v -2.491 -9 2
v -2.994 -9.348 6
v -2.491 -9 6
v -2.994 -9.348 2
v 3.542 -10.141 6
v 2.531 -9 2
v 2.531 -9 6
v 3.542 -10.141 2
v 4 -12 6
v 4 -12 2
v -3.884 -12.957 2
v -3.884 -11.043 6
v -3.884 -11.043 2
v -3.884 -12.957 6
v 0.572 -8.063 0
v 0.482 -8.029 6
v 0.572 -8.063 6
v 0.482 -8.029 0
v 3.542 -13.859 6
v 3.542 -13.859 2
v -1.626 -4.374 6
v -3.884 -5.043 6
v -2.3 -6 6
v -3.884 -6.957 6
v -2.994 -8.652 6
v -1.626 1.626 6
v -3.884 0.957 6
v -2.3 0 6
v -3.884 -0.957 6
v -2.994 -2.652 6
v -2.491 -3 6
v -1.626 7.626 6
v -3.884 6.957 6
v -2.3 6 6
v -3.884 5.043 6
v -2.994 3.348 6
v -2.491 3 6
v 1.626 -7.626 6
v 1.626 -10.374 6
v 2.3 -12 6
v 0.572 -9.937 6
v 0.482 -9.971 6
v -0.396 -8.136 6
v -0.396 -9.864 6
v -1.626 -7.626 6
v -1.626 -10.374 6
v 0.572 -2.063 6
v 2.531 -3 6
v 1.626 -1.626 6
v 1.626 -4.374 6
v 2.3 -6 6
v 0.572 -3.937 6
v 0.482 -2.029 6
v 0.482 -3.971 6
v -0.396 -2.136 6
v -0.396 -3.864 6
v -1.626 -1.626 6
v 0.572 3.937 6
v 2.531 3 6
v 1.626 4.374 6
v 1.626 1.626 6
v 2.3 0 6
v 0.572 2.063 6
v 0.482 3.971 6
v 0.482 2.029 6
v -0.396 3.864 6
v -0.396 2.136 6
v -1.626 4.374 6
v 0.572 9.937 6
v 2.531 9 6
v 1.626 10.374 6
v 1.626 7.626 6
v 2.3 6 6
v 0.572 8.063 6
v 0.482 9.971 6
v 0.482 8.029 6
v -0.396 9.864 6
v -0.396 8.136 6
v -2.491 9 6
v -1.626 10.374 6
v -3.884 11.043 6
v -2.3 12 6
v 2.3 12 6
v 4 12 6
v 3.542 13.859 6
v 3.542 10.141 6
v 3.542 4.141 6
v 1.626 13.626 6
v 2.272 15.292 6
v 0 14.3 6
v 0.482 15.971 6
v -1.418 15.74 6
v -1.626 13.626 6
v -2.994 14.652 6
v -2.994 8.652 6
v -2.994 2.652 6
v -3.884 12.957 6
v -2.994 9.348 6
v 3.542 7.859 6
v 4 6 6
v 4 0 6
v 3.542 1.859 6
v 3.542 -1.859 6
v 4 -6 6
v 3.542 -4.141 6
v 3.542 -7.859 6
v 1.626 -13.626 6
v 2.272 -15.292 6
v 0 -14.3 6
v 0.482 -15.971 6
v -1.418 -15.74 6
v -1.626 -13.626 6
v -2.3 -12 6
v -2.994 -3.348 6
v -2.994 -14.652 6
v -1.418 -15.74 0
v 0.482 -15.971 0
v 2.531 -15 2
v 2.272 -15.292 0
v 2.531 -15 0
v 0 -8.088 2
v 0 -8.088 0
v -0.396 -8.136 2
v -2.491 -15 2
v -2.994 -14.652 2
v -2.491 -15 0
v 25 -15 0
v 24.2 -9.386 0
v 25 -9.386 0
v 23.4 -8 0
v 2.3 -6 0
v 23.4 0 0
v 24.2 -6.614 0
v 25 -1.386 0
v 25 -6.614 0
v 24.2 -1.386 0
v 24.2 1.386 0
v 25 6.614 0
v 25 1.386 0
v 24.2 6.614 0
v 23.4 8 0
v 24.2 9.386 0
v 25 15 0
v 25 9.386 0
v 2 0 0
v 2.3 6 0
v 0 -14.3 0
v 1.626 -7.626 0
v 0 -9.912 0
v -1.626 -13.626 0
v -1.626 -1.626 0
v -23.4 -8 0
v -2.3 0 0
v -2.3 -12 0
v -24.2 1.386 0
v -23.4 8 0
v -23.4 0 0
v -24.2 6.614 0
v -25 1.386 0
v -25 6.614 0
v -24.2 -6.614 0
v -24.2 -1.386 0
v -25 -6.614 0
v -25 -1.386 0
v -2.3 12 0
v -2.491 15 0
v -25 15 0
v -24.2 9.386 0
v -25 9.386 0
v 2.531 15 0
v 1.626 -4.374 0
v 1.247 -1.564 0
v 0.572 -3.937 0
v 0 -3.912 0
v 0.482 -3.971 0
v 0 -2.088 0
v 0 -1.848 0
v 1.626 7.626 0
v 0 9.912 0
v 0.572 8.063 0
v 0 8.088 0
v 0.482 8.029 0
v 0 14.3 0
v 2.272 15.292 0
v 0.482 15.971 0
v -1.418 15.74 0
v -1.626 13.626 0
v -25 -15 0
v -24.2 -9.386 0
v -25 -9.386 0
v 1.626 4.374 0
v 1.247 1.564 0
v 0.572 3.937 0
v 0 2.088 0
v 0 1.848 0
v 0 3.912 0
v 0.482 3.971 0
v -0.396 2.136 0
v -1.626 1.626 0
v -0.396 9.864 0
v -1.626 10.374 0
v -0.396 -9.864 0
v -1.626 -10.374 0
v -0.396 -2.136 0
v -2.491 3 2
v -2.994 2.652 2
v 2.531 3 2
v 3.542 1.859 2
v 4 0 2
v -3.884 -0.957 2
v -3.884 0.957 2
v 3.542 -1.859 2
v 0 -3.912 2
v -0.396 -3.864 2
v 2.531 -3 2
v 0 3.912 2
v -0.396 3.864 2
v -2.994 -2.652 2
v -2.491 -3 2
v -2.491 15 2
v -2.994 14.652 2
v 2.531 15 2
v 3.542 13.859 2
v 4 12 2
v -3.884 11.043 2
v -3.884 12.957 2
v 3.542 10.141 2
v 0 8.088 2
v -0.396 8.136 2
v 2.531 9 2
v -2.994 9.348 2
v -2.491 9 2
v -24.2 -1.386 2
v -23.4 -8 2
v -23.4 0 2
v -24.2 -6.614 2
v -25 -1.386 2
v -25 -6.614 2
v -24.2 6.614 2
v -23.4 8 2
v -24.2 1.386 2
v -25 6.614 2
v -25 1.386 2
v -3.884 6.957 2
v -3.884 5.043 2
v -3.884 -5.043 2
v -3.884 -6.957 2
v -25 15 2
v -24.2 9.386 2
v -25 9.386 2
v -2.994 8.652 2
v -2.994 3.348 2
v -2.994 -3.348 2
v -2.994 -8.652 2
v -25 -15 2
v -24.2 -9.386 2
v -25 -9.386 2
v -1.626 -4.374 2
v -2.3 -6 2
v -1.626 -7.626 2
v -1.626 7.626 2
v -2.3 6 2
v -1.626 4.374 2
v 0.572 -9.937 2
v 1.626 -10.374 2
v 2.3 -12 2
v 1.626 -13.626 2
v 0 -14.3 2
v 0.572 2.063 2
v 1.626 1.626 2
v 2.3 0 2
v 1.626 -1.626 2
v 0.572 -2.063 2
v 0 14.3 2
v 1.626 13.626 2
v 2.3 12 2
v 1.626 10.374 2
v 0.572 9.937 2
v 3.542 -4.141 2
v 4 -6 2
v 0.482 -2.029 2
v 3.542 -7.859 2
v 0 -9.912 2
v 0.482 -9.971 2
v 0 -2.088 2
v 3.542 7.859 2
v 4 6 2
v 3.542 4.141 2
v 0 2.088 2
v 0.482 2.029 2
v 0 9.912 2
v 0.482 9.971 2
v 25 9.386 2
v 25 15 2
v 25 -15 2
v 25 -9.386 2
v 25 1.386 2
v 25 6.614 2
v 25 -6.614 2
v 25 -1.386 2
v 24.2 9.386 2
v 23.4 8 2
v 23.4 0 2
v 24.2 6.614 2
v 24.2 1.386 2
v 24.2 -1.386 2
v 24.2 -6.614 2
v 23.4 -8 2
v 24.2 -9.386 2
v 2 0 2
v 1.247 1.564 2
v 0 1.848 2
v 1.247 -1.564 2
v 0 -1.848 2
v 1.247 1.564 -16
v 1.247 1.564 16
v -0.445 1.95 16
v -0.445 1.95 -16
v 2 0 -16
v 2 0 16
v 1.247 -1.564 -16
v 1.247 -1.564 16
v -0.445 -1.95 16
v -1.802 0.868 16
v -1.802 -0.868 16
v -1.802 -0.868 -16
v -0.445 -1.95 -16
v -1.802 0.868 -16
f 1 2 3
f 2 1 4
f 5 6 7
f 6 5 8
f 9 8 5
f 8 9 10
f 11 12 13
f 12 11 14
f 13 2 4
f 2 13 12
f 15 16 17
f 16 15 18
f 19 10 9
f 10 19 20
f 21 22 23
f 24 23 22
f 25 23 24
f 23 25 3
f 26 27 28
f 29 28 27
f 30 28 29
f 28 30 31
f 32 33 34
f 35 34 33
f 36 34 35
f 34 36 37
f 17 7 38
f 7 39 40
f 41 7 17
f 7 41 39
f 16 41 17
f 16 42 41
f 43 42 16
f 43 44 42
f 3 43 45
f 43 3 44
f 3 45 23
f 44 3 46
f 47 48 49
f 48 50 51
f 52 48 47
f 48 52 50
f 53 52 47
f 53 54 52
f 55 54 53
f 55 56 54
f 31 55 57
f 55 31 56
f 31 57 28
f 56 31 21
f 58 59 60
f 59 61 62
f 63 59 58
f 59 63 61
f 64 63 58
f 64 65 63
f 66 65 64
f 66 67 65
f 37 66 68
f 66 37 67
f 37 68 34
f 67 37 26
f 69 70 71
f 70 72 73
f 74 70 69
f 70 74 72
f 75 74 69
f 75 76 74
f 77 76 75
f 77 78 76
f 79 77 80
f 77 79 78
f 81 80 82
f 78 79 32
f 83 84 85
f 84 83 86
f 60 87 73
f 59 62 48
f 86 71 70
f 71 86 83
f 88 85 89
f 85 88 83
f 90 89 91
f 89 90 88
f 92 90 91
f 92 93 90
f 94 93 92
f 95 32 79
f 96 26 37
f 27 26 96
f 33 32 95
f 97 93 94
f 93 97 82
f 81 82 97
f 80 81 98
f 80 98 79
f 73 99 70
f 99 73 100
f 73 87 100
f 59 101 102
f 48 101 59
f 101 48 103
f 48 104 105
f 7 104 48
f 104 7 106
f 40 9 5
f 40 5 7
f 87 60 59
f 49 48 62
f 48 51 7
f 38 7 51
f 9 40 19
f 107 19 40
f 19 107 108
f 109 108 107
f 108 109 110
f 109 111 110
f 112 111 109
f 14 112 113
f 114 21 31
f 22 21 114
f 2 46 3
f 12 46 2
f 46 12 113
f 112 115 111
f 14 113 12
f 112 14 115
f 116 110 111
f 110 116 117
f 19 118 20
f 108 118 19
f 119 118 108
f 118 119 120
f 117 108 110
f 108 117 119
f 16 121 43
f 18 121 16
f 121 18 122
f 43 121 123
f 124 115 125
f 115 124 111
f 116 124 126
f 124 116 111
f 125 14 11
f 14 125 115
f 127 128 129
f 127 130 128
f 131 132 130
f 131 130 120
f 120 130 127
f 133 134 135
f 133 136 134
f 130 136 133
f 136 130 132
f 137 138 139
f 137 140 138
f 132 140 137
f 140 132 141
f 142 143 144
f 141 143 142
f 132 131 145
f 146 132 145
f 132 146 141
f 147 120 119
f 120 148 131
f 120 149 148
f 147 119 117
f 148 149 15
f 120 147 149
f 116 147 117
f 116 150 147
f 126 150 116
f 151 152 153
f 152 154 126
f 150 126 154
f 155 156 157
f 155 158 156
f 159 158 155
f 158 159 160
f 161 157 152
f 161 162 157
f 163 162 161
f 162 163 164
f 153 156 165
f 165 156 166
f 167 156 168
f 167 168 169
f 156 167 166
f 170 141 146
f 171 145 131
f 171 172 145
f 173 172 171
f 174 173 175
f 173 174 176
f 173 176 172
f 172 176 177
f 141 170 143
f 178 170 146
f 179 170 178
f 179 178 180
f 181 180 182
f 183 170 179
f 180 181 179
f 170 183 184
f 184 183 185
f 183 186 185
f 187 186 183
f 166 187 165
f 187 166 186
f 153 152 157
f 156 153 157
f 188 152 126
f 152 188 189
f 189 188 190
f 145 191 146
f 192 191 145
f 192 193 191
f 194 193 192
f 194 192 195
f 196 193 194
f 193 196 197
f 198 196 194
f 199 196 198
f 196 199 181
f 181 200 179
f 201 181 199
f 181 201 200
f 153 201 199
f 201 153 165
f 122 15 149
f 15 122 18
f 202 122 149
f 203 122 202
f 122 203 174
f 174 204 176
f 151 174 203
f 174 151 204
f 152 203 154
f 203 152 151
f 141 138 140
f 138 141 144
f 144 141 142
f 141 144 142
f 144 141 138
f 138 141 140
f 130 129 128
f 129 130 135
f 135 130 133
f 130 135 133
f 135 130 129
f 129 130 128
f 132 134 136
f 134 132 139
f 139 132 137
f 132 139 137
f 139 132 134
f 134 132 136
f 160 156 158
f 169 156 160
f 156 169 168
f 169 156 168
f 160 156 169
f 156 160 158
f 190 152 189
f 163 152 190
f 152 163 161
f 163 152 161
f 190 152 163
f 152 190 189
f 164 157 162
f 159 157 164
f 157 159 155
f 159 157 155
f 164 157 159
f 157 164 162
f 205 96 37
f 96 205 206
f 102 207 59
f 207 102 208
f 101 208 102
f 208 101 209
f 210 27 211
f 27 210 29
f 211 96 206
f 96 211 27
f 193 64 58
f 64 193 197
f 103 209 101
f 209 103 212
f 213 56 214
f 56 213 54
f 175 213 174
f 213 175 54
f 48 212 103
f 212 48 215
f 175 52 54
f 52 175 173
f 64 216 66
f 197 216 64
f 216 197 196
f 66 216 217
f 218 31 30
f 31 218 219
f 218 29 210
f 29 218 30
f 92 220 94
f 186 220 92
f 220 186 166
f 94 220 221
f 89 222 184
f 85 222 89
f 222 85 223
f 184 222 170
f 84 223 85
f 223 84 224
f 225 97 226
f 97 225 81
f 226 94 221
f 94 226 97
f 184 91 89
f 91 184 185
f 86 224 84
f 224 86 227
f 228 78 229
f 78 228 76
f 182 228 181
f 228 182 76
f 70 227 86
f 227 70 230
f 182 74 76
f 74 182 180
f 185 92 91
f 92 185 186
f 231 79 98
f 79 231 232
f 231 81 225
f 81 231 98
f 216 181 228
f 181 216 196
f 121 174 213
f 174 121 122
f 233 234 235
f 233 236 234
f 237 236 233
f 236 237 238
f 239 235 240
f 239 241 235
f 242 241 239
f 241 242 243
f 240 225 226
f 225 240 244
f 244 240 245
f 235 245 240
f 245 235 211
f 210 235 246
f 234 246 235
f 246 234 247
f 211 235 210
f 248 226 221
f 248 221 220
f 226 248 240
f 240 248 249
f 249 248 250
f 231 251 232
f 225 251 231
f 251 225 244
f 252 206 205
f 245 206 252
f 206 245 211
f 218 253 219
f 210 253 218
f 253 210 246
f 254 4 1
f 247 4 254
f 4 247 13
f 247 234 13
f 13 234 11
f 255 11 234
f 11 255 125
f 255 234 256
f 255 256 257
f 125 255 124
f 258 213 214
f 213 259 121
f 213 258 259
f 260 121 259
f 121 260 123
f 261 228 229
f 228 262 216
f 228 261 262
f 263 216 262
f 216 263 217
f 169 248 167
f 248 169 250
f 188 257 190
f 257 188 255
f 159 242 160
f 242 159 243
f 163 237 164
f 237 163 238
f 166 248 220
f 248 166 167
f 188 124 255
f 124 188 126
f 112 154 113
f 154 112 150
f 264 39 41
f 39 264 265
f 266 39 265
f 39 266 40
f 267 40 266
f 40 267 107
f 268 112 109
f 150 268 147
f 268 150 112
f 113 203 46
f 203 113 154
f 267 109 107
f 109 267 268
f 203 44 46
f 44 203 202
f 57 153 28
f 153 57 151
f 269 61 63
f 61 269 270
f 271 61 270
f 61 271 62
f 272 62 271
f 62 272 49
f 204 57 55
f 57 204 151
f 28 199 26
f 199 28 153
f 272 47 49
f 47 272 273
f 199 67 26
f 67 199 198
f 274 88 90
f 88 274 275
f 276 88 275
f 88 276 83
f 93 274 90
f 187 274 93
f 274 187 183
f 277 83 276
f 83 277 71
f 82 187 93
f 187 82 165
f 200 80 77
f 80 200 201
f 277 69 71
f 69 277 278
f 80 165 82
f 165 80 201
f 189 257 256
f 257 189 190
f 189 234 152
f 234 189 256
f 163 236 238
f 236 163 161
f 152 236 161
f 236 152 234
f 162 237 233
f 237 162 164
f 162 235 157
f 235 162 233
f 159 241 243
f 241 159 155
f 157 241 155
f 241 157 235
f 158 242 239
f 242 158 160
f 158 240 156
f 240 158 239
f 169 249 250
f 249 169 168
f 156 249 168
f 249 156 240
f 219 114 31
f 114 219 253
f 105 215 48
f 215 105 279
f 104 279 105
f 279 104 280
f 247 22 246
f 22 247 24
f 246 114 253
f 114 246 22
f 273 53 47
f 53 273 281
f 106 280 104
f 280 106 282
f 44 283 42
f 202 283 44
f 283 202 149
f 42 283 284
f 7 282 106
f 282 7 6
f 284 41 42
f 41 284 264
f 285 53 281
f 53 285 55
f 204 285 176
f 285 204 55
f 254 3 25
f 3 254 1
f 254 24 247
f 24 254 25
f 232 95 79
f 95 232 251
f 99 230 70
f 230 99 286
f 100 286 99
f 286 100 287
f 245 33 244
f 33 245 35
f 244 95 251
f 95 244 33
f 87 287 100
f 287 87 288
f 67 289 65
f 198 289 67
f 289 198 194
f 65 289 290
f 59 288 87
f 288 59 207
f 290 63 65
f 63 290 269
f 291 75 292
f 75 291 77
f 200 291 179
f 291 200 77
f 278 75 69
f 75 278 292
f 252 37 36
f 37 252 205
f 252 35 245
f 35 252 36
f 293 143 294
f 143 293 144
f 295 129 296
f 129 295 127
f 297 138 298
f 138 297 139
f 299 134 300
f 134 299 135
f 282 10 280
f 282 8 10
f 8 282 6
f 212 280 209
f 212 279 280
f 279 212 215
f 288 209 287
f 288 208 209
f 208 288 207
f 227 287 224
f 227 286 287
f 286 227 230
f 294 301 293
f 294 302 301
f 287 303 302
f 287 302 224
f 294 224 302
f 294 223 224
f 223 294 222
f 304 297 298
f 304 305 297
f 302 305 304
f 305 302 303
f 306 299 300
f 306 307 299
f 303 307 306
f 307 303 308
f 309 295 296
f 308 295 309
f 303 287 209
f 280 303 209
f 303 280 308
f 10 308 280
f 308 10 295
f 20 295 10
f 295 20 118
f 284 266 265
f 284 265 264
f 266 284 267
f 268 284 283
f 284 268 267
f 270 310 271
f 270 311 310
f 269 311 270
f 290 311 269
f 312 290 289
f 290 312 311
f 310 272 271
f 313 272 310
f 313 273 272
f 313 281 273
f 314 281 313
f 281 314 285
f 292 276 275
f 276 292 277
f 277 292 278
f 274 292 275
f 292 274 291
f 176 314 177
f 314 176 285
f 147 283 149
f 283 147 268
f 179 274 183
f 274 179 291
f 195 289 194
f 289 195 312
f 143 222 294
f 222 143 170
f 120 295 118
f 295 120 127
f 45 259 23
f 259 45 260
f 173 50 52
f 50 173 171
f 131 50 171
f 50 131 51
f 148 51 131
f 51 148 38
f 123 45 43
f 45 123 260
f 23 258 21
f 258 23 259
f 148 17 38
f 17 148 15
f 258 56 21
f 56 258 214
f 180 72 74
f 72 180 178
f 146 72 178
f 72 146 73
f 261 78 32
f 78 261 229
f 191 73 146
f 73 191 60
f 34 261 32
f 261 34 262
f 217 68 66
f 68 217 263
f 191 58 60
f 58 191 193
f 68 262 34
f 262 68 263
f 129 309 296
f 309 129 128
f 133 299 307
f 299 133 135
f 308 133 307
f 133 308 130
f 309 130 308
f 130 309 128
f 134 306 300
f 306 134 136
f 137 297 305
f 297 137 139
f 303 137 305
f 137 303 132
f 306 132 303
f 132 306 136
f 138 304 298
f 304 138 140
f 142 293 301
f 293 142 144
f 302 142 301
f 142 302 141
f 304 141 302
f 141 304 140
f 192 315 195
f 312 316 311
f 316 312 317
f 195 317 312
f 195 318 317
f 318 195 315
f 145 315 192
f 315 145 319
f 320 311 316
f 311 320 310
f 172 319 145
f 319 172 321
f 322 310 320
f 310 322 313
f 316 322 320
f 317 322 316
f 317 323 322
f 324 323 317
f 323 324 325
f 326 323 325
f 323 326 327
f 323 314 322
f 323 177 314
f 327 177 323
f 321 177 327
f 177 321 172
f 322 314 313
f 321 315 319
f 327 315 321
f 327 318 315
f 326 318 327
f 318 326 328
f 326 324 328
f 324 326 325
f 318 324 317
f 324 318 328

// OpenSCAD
// 家具用小型バット蝶番 (Butt Hinge)
// 3つのパーツ: 左板(Left Leaf), 右板(Right Leaf), ピン軸(Pin)

// --- パラメータ設定 ---
leaf_w = 25;          // 横幅 (回転方向)
leaf_h = 30;          // 縦幅 (ピン軸方向)
leaf_t = 2;           // 厚さ
pin_d = 4;            // ピン軸直径
pin_l = 32;           // ピン軸長さ
knuckle_d = 8;        // Knuckle外径
knuckle_id = 4.6;     // Knuckle内径 (4.0 + 0.3*2)
knuckle_h = 6;        // 各Knuckleの高さ (30mm / 5)
m3_hole_d = 3.2;      // M3貫通穴直径
m3_csc_d = 6;         // 皿穴直径
m3_csc_dep = 1;       // 皿穴深さ
m3_pitch = 8;         // 穴ピッチ

// --- モジュール定義 ---

// 皿穴と貫通穴
module m3_hole() {
    difference() {
        // 貫通穴
        cylinder(h = leaf_t + 1, d = m3_hole_d, center = false);
        // 皿穴 (表面から1mmのテーパー)
        // d1(底面側)を狭く、d2(表面側)を広くすることで皿穴を形成
        translate([0, 0, -m3_csc_dep])
            cylinder(h = m3_csc_dep, d1 = m3_hole_d, d2 = m3_csc_d, center = false);
    }
}

// 片側の板 (Knuckleを含む)
module leaf_part(is_left = true) {
    // 座標のオフセット: 左板は -25 から 0、右板は 0 から 25 に配置
    offset_x = is_left ? -leaf_w : 0;
    
    // Knuckleの配置位置 (Y軸方向)
    // 30mmを5等分(6mmずつ)した中心点: -12, -6, 0, 6, 12
    // 左板は外側(1, 5)と中央(3)の合計3個
    // 右板は中間(2, 4)の合計2個
    knuckle_y_pos = is_left ? [-12, 0, 12] : [-6, 6];
    
    difference() {
        union() {
            // 板本体 (Y軸方向を -leaf_h/2 から leaf_h/2 に配置)
            translate([offset_x, -leaf_h/2, 0])
                cube([leaf_w, leaf_h, leaf_t]);
            
            // Knuckleの配置 (X=0を基準に配置)
            for (y_pos = knuckle_y_pos) {
                translate([0, y_pos, 0])
                    cylinder(h = knuckle_h, d = knuckle_d, center = false);
            }
        }
        
        // ピン軸の通り道（Knuckle内）をくり抜く
        for (y_pos = knuckle_y_pos) {
            translate([0, y_pos, -1])
                cylinder(h = knuckle_h + 2, d = knuckle_id, center = false);
        }
        
        // M3穴の配置 (Knuckleから離れた側 = X軸方向の端)
        // Y方向には中央付近に3個配置 (ピッチ8mm)
        // 皿穴を表面（Z=0またはZ=leaf_t）に作るため、配置を調整
        for (y_pos = [-8, 0, 8]) {
            translate([is_left ? -leaf_w : leaf_w, y_pos, 0])
                m3_hole();
        }
    }
}

// --- 組み立て ---

// 左板 (x < 0 側に伸びる)
leaf_part(is_left = true);

// 右板 (x > 0 側に伸びる)
leaf_part(is_left = false);

// ピン軸 (中心をY軸に重ねる)
// 長さ32mm、両端1mmずつKnuckleから飛び出す (Knuckle範囲はY=-15〜15)
// ピンの端は ±16 に位置し、Knuckleの端 ±15 から 1mm 飛び出す
translate([0, 0, 0])
    cylinder(h = pin_l, d = pin_d, center = true);
